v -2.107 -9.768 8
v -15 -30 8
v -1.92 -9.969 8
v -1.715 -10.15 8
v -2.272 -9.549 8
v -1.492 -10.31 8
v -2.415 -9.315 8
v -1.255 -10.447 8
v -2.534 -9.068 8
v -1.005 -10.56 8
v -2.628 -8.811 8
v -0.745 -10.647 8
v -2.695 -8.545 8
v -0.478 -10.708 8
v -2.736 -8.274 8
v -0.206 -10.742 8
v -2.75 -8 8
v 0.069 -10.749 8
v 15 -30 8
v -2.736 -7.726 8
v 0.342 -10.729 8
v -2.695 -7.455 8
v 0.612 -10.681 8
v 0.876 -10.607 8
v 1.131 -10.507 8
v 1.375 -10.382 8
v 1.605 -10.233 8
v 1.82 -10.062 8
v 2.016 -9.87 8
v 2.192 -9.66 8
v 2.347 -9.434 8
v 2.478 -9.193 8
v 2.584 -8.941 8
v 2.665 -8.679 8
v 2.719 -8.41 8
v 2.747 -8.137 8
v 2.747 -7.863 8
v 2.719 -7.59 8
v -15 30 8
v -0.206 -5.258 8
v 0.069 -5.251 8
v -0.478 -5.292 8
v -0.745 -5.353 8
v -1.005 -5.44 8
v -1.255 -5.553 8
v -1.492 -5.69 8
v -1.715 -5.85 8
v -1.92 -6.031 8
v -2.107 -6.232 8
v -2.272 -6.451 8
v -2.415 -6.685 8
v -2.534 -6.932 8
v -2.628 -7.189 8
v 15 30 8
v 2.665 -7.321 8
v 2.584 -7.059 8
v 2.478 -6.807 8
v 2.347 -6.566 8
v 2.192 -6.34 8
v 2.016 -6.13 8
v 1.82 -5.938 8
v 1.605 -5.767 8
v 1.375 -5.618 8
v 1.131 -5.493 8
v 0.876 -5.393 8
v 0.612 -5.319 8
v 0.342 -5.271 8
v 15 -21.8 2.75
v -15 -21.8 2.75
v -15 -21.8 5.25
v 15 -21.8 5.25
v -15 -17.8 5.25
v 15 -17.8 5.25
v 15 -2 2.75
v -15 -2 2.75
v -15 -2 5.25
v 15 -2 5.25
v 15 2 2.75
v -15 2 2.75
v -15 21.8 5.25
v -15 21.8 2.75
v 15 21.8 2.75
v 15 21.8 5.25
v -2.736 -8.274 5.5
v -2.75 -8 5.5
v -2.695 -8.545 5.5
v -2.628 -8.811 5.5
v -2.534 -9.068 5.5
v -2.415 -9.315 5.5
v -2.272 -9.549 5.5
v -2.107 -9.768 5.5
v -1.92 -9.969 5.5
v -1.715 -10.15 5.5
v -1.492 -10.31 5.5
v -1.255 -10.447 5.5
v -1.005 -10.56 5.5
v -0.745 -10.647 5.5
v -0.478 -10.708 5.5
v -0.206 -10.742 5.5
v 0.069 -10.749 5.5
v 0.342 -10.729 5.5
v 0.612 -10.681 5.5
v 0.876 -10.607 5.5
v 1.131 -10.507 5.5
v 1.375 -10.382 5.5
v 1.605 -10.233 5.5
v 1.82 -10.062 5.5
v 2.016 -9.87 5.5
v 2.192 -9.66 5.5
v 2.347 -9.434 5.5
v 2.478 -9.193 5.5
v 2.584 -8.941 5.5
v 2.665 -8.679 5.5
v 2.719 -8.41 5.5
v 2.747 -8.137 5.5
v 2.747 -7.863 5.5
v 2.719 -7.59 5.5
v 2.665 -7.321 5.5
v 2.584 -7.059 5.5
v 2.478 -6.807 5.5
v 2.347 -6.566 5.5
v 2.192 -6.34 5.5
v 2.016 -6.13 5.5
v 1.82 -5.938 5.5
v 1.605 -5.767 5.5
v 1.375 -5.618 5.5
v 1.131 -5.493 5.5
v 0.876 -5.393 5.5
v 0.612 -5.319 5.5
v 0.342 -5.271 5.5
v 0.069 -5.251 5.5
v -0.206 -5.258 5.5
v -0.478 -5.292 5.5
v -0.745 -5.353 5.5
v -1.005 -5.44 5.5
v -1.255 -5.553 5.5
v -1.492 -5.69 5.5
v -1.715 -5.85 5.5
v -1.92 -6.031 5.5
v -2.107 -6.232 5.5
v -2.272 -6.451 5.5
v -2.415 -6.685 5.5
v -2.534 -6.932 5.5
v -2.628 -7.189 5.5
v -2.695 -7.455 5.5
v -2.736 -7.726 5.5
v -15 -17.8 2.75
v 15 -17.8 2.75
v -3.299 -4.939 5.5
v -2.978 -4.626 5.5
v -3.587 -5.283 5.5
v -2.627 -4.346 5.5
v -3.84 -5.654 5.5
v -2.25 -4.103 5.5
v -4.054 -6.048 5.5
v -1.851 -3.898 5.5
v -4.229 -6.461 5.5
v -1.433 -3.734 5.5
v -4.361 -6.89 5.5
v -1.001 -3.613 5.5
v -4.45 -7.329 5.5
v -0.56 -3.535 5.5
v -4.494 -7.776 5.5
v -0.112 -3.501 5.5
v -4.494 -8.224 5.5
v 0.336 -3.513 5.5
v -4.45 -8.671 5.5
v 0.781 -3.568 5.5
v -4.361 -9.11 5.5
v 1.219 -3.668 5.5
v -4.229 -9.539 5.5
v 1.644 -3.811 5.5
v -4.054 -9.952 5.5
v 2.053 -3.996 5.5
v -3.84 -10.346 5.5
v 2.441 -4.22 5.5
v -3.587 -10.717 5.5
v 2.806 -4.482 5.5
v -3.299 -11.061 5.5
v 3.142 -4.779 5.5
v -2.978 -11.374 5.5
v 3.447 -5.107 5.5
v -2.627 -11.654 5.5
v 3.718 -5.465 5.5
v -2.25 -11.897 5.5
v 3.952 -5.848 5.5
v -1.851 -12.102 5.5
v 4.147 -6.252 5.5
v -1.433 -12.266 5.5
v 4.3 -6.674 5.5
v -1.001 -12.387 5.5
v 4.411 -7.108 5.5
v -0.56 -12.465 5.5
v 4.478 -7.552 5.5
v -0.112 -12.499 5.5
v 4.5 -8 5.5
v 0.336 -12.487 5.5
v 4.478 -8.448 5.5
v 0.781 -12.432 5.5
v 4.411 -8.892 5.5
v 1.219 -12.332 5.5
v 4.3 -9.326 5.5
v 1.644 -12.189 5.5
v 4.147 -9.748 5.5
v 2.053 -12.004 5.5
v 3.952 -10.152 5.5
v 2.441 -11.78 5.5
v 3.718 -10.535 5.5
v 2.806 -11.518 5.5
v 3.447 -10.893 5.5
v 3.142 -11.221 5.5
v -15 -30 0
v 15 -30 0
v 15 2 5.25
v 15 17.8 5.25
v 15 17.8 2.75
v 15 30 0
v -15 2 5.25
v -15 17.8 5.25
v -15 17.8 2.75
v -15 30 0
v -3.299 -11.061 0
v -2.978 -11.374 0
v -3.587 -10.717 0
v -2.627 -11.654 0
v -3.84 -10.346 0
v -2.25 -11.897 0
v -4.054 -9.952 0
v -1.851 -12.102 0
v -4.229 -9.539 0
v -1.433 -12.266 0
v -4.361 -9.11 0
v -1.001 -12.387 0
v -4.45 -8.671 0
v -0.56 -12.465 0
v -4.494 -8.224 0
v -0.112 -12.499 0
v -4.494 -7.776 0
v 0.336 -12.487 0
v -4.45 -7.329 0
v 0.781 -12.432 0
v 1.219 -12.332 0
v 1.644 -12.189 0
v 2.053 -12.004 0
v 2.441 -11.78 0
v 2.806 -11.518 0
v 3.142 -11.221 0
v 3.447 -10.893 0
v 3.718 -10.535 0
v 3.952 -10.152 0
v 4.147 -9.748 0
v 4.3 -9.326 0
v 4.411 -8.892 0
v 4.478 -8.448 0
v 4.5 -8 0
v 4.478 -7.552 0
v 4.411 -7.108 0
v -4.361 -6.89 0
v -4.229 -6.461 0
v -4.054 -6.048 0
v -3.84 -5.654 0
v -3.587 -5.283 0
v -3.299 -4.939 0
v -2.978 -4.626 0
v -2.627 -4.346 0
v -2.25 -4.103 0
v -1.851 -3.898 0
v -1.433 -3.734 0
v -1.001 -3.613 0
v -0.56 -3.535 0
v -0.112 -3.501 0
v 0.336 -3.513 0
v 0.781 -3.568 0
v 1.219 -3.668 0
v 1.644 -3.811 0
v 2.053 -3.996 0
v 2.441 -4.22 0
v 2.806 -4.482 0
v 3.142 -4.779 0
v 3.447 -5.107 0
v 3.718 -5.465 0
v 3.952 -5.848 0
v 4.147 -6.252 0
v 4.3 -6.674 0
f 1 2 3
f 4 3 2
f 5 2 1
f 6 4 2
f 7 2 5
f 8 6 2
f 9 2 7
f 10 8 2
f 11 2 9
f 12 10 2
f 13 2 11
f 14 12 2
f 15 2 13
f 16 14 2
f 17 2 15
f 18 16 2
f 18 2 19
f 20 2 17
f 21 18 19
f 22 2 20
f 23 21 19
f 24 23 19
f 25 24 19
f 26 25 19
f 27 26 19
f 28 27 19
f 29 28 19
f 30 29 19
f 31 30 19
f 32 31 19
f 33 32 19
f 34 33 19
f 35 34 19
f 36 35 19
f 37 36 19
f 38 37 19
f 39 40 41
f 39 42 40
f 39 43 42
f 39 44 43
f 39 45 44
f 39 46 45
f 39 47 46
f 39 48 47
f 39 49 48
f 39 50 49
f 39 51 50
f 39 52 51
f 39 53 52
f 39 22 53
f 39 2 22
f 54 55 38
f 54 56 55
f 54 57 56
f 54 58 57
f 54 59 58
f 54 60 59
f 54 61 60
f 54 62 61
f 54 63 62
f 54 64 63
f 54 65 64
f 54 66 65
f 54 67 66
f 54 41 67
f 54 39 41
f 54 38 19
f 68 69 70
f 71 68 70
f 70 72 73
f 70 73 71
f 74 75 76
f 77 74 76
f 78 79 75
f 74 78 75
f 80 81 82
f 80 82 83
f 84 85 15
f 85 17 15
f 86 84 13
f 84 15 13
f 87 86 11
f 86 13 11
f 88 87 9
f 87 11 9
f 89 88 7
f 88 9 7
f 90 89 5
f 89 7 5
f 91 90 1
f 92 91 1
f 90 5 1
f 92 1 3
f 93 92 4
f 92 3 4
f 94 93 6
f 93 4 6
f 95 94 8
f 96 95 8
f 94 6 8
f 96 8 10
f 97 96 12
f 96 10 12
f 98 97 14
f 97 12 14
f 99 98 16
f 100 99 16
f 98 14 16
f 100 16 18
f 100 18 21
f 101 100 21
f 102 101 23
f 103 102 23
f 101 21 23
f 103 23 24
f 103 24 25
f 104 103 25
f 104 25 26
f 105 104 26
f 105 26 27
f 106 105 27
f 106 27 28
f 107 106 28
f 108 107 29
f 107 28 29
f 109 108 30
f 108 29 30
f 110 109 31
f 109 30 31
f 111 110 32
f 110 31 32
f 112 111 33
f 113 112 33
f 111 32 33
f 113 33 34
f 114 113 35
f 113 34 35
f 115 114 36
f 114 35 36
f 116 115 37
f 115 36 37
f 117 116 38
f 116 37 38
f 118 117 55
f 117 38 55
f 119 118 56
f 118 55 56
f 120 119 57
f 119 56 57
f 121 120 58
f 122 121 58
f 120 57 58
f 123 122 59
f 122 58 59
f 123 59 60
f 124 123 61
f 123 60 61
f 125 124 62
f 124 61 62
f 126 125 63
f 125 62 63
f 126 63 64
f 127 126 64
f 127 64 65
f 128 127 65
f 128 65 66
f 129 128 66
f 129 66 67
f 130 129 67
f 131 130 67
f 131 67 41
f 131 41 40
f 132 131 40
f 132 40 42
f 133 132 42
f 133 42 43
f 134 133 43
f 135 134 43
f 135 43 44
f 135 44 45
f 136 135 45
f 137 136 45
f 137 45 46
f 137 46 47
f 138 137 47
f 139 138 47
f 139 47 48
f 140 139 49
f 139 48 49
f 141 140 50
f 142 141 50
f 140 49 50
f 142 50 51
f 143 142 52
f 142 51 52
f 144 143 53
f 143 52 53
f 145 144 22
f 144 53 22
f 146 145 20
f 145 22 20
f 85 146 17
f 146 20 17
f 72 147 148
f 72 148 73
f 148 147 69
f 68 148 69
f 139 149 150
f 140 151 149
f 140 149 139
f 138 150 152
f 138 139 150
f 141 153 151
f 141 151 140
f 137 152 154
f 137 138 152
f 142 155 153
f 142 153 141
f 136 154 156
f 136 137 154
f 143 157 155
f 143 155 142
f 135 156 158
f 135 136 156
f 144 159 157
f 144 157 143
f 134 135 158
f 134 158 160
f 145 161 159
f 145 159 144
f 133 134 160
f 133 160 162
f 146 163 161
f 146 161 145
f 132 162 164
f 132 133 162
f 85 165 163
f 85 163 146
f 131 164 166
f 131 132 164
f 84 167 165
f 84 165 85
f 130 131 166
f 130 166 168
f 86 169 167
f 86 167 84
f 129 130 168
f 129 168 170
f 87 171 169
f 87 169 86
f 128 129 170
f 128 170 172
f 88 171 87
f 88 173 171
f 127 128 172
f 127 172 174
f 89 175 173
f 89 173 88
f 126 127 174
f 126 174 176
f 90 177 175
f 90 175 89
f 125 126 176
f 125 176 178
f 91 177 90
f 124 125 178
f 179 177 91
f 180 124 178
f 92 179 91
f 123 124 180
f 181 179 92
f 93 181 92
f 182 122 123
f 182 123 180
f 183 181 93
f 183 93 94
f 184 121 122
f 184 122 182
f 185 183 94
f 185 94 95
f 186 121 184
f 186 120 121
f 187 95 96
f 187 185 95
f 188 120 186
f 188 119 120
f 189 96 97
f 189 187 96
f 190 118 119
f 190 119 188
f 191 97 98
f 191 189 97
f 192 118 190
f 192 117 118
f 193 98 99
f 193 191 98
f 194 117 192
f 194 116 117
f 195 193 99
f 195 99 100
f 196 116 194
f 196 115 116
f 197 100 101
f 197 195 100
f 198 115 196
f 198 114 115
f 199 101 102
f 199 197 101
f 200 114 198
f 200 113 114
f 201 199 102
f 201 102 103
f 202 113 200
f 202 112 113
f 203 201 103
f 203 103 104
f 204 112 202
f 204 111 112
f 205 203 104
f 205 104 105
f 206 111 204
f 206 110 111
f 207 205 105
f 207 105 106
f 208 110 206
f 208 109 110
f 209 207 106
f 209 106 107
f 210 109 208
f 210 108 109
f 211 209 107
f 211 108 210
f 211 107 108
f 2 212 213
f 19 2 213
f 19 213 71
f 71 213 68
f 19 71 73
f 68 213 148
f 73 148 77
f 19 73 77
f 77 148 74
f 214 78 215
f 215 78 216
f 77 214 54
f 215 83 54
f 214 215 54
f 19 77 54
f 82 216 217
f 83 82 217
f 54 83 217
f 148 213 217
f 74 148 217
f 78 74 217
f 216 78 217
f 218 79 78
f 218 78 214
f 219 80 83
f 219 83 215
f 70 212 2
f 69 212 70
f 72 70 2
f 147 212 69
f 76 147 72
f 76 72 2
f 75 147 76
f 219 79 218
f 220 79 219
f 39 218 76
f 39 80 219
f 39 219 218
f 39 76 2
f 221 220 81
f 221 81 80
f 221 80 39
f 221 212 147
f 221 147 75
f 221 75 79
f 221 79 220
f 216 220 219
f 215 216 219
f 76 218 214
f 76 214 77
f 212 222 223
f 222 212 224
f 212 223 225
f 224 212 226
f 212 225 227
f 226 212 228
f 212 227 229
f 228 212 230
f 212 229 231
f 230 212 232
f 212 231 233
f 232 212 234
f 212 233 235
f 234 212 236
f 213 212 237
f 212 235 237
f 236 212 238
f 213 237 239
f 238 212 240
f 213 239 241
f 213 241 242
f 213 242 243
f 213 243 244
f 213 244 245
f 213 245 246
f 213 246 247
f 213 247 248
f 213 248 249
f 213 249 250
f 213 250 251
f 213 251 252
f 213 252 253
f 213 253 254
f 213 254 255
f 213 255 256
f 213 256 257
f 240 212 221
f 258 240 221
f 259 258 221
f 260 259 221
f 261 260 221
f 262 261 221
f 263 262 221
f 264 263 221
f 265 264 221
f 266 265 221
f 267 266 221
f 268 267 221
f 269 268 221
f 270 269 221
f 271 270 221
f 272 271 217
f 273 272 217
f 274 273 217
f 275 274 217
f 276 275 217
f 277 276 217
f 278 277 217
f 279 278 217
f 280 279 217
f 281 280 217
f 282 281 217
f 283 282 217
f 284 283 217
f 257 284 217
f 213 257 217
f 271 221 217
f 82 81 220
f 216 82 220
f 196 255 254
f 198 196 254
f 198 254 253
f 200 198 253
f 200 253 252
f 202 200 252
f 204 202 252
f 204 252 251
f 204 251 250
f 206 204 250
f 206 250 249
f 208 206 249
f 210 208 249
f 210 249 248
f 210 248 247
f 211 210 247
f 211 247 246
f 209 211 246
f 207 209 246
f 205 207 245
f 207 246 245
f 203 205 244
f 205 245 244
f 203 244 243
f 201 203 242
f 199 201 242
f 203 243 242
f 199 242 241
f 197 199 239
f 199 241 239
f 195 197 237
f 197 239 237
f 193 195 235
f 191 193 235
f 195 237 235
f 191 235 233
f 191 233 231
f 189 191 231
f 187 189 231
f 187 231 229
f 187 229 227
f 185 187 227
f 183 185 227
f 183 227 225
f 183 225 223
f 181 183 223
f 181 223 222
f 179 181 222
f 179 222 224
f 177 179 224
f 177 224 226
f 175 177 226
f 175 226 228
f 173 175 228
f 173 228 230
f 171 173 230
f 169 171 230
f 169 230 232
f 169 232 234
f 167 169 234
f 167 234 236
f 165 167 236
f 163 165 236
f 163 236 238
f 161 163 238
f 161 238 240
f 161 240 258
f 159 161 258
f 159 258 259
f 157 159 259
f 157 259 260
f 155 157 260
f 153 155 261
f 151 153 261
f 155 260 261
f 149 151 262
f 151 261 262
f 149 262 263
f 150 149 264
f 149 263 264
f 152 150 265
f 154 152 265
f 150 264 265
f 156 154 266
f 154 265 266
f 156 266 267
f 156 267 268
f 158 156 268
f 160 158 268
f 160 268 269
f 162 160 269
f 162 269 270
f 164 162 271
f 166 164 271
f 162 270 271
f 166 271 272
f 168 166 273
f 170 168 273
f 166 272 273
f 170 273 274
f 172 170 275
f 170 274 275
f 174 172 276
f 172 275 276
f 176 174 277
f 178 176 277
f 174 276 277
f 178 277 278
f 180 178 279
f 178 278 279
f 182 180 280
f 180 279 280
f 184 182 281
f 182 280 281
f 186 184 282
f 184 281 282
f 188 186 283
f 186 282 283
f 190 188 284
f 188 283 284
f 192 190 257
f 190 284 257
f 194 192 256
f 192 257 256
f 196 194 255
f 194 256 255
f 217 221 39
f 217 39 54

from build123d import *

# Parameters (mm, degrees)
F0_W           = 30
F0_H           = 60
F1_DEPTH       = 8
F2_D           = 5.5
F2_DEPTH       = 30
F2_CBORE_D     = 9
F2_CBORE_DEPTH = 5.5
F2_TIP         = 1.6523667023
F3_W           = 4
F3_H           = 2.5
F4_DEPTH       = 30.001


with BuildPart() as f1:
    # F0 (on Top) → F1 (new body)
    with BuildSketch(Plane.XY):
        Rectangle(F0_W, F0_H)
    extrude(amount=F1_DEPTH)

    # F2
    with Locations(Plane(origin=(0, 0, 0), x_dir=(1, 0, 0), z_dir=(0, 0, -1))):
        with Locations((0, 8)):
            CounterBoreHole(F2_D / 2, F2_CBORE_D / 2, F2_CBORE_DEPTH, depth=F2_DEPTH)
            with Locations((0, 0, -(F2_DEPTH + F2_TIP / 2))):  # 118° drill point
                Cone(0, F2_D / 2, F2_TIP, mode=Mode.SUBTRACT)

    # F3 (on face) → F4 (cut, through all)
    with BuildSketch(Plane(origin=(-15, 0, 0), x_dir=(0, -1, 0), z_dir=(-1, 0, 0))):
        with Locations((-19.8, 4)):
            Rectangle(F3_W, F3_H)
        with Locations((0, 4)):
            Rectangle(F3_W, F3_H)
        with Locations((19.8, 4)):
            Rectangle(F3_W, F3_H)
    extrude(amount=-F4_DEPTH, mode=Mode.SUBTRACT)


solid = f1.part
